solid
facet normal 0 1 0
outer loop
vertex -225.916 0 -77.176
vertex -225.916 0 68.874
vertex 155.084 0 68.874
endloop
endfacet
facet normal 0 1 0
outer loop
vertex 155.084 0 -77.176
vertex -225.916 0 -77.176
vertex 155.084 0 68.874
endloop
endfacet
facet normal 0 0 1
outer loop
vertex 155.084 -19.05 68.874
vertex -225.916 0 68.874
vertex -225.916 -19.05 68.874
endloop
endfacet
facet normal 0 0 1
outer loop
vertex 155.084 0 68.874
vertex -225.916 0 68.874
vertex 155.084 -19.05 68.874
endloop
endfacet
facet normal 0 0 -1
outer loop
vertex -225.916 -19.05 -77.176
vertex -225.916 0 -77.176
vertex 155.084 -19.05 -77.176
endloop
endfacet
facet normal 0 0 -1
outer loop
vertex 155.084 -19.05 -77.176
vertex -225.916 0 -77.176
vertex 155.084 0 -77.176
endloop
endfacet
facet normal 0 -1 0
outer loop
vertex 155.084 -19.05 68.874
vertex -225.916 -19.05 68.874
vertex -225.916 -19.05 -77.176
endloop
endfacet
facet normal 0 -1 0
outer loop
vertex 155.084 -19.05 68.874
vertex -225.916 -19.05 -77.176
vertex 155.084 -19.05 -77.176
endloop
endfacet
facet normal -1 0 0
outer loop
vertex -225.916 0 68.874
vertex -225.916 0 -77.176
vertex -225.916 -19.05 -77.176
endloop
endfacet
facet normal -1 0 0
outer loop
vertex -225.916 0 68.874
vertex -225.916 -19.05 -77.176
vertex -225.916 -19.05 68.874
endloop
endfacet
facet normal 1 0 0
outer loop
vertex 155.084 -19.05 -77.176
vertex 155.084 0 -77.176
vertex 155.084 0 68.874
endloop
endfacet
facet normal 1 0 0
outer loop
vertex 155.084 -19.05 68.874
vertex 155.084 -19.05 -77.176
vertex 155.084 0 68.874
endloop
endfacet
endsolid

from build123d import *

# Parameters (mm, degrees)
F0_W     = 390.3202265501
F0_H     = 155.9184342623
F1_DEPTH = 25.4
F3_W     = 381
F3_H     = 152.4
F4_DEPTH = 25.4
F6_W     = 381
F6_H     = 146.05
F7_DEPTH = 19.05


with BuildPart() as f1:
    # F0 (on Right) → F1 (new body)
    with BuildSketch(Plane.YZ):
        with Locations((4.6128705144, -15.4182091355)):
            Rectangle(F0_W, F0_H)
    extrude(amount=F1_DEPTH)


with BuildPart() as f4:
    # F3 (on Front) → F4 (new body)
    with BuildSketch(Plane.XZ):
        with Locations((8.0656352626, 25.2555180341)):
            Rectangle(F3_W, F3_H)
    extrude(amount=F4_DEPTH)


with BuildPart() as f7:
    # F6 (on Front) → F7 (new body)
    with BuildSketch(Plane.XZ):
        with Locations((-35.415730298, -4.1510537267)):
            Rectangle(F6_W, F6_H)
    extrude(amount=F7_DEPTH)


solid = f7.part
